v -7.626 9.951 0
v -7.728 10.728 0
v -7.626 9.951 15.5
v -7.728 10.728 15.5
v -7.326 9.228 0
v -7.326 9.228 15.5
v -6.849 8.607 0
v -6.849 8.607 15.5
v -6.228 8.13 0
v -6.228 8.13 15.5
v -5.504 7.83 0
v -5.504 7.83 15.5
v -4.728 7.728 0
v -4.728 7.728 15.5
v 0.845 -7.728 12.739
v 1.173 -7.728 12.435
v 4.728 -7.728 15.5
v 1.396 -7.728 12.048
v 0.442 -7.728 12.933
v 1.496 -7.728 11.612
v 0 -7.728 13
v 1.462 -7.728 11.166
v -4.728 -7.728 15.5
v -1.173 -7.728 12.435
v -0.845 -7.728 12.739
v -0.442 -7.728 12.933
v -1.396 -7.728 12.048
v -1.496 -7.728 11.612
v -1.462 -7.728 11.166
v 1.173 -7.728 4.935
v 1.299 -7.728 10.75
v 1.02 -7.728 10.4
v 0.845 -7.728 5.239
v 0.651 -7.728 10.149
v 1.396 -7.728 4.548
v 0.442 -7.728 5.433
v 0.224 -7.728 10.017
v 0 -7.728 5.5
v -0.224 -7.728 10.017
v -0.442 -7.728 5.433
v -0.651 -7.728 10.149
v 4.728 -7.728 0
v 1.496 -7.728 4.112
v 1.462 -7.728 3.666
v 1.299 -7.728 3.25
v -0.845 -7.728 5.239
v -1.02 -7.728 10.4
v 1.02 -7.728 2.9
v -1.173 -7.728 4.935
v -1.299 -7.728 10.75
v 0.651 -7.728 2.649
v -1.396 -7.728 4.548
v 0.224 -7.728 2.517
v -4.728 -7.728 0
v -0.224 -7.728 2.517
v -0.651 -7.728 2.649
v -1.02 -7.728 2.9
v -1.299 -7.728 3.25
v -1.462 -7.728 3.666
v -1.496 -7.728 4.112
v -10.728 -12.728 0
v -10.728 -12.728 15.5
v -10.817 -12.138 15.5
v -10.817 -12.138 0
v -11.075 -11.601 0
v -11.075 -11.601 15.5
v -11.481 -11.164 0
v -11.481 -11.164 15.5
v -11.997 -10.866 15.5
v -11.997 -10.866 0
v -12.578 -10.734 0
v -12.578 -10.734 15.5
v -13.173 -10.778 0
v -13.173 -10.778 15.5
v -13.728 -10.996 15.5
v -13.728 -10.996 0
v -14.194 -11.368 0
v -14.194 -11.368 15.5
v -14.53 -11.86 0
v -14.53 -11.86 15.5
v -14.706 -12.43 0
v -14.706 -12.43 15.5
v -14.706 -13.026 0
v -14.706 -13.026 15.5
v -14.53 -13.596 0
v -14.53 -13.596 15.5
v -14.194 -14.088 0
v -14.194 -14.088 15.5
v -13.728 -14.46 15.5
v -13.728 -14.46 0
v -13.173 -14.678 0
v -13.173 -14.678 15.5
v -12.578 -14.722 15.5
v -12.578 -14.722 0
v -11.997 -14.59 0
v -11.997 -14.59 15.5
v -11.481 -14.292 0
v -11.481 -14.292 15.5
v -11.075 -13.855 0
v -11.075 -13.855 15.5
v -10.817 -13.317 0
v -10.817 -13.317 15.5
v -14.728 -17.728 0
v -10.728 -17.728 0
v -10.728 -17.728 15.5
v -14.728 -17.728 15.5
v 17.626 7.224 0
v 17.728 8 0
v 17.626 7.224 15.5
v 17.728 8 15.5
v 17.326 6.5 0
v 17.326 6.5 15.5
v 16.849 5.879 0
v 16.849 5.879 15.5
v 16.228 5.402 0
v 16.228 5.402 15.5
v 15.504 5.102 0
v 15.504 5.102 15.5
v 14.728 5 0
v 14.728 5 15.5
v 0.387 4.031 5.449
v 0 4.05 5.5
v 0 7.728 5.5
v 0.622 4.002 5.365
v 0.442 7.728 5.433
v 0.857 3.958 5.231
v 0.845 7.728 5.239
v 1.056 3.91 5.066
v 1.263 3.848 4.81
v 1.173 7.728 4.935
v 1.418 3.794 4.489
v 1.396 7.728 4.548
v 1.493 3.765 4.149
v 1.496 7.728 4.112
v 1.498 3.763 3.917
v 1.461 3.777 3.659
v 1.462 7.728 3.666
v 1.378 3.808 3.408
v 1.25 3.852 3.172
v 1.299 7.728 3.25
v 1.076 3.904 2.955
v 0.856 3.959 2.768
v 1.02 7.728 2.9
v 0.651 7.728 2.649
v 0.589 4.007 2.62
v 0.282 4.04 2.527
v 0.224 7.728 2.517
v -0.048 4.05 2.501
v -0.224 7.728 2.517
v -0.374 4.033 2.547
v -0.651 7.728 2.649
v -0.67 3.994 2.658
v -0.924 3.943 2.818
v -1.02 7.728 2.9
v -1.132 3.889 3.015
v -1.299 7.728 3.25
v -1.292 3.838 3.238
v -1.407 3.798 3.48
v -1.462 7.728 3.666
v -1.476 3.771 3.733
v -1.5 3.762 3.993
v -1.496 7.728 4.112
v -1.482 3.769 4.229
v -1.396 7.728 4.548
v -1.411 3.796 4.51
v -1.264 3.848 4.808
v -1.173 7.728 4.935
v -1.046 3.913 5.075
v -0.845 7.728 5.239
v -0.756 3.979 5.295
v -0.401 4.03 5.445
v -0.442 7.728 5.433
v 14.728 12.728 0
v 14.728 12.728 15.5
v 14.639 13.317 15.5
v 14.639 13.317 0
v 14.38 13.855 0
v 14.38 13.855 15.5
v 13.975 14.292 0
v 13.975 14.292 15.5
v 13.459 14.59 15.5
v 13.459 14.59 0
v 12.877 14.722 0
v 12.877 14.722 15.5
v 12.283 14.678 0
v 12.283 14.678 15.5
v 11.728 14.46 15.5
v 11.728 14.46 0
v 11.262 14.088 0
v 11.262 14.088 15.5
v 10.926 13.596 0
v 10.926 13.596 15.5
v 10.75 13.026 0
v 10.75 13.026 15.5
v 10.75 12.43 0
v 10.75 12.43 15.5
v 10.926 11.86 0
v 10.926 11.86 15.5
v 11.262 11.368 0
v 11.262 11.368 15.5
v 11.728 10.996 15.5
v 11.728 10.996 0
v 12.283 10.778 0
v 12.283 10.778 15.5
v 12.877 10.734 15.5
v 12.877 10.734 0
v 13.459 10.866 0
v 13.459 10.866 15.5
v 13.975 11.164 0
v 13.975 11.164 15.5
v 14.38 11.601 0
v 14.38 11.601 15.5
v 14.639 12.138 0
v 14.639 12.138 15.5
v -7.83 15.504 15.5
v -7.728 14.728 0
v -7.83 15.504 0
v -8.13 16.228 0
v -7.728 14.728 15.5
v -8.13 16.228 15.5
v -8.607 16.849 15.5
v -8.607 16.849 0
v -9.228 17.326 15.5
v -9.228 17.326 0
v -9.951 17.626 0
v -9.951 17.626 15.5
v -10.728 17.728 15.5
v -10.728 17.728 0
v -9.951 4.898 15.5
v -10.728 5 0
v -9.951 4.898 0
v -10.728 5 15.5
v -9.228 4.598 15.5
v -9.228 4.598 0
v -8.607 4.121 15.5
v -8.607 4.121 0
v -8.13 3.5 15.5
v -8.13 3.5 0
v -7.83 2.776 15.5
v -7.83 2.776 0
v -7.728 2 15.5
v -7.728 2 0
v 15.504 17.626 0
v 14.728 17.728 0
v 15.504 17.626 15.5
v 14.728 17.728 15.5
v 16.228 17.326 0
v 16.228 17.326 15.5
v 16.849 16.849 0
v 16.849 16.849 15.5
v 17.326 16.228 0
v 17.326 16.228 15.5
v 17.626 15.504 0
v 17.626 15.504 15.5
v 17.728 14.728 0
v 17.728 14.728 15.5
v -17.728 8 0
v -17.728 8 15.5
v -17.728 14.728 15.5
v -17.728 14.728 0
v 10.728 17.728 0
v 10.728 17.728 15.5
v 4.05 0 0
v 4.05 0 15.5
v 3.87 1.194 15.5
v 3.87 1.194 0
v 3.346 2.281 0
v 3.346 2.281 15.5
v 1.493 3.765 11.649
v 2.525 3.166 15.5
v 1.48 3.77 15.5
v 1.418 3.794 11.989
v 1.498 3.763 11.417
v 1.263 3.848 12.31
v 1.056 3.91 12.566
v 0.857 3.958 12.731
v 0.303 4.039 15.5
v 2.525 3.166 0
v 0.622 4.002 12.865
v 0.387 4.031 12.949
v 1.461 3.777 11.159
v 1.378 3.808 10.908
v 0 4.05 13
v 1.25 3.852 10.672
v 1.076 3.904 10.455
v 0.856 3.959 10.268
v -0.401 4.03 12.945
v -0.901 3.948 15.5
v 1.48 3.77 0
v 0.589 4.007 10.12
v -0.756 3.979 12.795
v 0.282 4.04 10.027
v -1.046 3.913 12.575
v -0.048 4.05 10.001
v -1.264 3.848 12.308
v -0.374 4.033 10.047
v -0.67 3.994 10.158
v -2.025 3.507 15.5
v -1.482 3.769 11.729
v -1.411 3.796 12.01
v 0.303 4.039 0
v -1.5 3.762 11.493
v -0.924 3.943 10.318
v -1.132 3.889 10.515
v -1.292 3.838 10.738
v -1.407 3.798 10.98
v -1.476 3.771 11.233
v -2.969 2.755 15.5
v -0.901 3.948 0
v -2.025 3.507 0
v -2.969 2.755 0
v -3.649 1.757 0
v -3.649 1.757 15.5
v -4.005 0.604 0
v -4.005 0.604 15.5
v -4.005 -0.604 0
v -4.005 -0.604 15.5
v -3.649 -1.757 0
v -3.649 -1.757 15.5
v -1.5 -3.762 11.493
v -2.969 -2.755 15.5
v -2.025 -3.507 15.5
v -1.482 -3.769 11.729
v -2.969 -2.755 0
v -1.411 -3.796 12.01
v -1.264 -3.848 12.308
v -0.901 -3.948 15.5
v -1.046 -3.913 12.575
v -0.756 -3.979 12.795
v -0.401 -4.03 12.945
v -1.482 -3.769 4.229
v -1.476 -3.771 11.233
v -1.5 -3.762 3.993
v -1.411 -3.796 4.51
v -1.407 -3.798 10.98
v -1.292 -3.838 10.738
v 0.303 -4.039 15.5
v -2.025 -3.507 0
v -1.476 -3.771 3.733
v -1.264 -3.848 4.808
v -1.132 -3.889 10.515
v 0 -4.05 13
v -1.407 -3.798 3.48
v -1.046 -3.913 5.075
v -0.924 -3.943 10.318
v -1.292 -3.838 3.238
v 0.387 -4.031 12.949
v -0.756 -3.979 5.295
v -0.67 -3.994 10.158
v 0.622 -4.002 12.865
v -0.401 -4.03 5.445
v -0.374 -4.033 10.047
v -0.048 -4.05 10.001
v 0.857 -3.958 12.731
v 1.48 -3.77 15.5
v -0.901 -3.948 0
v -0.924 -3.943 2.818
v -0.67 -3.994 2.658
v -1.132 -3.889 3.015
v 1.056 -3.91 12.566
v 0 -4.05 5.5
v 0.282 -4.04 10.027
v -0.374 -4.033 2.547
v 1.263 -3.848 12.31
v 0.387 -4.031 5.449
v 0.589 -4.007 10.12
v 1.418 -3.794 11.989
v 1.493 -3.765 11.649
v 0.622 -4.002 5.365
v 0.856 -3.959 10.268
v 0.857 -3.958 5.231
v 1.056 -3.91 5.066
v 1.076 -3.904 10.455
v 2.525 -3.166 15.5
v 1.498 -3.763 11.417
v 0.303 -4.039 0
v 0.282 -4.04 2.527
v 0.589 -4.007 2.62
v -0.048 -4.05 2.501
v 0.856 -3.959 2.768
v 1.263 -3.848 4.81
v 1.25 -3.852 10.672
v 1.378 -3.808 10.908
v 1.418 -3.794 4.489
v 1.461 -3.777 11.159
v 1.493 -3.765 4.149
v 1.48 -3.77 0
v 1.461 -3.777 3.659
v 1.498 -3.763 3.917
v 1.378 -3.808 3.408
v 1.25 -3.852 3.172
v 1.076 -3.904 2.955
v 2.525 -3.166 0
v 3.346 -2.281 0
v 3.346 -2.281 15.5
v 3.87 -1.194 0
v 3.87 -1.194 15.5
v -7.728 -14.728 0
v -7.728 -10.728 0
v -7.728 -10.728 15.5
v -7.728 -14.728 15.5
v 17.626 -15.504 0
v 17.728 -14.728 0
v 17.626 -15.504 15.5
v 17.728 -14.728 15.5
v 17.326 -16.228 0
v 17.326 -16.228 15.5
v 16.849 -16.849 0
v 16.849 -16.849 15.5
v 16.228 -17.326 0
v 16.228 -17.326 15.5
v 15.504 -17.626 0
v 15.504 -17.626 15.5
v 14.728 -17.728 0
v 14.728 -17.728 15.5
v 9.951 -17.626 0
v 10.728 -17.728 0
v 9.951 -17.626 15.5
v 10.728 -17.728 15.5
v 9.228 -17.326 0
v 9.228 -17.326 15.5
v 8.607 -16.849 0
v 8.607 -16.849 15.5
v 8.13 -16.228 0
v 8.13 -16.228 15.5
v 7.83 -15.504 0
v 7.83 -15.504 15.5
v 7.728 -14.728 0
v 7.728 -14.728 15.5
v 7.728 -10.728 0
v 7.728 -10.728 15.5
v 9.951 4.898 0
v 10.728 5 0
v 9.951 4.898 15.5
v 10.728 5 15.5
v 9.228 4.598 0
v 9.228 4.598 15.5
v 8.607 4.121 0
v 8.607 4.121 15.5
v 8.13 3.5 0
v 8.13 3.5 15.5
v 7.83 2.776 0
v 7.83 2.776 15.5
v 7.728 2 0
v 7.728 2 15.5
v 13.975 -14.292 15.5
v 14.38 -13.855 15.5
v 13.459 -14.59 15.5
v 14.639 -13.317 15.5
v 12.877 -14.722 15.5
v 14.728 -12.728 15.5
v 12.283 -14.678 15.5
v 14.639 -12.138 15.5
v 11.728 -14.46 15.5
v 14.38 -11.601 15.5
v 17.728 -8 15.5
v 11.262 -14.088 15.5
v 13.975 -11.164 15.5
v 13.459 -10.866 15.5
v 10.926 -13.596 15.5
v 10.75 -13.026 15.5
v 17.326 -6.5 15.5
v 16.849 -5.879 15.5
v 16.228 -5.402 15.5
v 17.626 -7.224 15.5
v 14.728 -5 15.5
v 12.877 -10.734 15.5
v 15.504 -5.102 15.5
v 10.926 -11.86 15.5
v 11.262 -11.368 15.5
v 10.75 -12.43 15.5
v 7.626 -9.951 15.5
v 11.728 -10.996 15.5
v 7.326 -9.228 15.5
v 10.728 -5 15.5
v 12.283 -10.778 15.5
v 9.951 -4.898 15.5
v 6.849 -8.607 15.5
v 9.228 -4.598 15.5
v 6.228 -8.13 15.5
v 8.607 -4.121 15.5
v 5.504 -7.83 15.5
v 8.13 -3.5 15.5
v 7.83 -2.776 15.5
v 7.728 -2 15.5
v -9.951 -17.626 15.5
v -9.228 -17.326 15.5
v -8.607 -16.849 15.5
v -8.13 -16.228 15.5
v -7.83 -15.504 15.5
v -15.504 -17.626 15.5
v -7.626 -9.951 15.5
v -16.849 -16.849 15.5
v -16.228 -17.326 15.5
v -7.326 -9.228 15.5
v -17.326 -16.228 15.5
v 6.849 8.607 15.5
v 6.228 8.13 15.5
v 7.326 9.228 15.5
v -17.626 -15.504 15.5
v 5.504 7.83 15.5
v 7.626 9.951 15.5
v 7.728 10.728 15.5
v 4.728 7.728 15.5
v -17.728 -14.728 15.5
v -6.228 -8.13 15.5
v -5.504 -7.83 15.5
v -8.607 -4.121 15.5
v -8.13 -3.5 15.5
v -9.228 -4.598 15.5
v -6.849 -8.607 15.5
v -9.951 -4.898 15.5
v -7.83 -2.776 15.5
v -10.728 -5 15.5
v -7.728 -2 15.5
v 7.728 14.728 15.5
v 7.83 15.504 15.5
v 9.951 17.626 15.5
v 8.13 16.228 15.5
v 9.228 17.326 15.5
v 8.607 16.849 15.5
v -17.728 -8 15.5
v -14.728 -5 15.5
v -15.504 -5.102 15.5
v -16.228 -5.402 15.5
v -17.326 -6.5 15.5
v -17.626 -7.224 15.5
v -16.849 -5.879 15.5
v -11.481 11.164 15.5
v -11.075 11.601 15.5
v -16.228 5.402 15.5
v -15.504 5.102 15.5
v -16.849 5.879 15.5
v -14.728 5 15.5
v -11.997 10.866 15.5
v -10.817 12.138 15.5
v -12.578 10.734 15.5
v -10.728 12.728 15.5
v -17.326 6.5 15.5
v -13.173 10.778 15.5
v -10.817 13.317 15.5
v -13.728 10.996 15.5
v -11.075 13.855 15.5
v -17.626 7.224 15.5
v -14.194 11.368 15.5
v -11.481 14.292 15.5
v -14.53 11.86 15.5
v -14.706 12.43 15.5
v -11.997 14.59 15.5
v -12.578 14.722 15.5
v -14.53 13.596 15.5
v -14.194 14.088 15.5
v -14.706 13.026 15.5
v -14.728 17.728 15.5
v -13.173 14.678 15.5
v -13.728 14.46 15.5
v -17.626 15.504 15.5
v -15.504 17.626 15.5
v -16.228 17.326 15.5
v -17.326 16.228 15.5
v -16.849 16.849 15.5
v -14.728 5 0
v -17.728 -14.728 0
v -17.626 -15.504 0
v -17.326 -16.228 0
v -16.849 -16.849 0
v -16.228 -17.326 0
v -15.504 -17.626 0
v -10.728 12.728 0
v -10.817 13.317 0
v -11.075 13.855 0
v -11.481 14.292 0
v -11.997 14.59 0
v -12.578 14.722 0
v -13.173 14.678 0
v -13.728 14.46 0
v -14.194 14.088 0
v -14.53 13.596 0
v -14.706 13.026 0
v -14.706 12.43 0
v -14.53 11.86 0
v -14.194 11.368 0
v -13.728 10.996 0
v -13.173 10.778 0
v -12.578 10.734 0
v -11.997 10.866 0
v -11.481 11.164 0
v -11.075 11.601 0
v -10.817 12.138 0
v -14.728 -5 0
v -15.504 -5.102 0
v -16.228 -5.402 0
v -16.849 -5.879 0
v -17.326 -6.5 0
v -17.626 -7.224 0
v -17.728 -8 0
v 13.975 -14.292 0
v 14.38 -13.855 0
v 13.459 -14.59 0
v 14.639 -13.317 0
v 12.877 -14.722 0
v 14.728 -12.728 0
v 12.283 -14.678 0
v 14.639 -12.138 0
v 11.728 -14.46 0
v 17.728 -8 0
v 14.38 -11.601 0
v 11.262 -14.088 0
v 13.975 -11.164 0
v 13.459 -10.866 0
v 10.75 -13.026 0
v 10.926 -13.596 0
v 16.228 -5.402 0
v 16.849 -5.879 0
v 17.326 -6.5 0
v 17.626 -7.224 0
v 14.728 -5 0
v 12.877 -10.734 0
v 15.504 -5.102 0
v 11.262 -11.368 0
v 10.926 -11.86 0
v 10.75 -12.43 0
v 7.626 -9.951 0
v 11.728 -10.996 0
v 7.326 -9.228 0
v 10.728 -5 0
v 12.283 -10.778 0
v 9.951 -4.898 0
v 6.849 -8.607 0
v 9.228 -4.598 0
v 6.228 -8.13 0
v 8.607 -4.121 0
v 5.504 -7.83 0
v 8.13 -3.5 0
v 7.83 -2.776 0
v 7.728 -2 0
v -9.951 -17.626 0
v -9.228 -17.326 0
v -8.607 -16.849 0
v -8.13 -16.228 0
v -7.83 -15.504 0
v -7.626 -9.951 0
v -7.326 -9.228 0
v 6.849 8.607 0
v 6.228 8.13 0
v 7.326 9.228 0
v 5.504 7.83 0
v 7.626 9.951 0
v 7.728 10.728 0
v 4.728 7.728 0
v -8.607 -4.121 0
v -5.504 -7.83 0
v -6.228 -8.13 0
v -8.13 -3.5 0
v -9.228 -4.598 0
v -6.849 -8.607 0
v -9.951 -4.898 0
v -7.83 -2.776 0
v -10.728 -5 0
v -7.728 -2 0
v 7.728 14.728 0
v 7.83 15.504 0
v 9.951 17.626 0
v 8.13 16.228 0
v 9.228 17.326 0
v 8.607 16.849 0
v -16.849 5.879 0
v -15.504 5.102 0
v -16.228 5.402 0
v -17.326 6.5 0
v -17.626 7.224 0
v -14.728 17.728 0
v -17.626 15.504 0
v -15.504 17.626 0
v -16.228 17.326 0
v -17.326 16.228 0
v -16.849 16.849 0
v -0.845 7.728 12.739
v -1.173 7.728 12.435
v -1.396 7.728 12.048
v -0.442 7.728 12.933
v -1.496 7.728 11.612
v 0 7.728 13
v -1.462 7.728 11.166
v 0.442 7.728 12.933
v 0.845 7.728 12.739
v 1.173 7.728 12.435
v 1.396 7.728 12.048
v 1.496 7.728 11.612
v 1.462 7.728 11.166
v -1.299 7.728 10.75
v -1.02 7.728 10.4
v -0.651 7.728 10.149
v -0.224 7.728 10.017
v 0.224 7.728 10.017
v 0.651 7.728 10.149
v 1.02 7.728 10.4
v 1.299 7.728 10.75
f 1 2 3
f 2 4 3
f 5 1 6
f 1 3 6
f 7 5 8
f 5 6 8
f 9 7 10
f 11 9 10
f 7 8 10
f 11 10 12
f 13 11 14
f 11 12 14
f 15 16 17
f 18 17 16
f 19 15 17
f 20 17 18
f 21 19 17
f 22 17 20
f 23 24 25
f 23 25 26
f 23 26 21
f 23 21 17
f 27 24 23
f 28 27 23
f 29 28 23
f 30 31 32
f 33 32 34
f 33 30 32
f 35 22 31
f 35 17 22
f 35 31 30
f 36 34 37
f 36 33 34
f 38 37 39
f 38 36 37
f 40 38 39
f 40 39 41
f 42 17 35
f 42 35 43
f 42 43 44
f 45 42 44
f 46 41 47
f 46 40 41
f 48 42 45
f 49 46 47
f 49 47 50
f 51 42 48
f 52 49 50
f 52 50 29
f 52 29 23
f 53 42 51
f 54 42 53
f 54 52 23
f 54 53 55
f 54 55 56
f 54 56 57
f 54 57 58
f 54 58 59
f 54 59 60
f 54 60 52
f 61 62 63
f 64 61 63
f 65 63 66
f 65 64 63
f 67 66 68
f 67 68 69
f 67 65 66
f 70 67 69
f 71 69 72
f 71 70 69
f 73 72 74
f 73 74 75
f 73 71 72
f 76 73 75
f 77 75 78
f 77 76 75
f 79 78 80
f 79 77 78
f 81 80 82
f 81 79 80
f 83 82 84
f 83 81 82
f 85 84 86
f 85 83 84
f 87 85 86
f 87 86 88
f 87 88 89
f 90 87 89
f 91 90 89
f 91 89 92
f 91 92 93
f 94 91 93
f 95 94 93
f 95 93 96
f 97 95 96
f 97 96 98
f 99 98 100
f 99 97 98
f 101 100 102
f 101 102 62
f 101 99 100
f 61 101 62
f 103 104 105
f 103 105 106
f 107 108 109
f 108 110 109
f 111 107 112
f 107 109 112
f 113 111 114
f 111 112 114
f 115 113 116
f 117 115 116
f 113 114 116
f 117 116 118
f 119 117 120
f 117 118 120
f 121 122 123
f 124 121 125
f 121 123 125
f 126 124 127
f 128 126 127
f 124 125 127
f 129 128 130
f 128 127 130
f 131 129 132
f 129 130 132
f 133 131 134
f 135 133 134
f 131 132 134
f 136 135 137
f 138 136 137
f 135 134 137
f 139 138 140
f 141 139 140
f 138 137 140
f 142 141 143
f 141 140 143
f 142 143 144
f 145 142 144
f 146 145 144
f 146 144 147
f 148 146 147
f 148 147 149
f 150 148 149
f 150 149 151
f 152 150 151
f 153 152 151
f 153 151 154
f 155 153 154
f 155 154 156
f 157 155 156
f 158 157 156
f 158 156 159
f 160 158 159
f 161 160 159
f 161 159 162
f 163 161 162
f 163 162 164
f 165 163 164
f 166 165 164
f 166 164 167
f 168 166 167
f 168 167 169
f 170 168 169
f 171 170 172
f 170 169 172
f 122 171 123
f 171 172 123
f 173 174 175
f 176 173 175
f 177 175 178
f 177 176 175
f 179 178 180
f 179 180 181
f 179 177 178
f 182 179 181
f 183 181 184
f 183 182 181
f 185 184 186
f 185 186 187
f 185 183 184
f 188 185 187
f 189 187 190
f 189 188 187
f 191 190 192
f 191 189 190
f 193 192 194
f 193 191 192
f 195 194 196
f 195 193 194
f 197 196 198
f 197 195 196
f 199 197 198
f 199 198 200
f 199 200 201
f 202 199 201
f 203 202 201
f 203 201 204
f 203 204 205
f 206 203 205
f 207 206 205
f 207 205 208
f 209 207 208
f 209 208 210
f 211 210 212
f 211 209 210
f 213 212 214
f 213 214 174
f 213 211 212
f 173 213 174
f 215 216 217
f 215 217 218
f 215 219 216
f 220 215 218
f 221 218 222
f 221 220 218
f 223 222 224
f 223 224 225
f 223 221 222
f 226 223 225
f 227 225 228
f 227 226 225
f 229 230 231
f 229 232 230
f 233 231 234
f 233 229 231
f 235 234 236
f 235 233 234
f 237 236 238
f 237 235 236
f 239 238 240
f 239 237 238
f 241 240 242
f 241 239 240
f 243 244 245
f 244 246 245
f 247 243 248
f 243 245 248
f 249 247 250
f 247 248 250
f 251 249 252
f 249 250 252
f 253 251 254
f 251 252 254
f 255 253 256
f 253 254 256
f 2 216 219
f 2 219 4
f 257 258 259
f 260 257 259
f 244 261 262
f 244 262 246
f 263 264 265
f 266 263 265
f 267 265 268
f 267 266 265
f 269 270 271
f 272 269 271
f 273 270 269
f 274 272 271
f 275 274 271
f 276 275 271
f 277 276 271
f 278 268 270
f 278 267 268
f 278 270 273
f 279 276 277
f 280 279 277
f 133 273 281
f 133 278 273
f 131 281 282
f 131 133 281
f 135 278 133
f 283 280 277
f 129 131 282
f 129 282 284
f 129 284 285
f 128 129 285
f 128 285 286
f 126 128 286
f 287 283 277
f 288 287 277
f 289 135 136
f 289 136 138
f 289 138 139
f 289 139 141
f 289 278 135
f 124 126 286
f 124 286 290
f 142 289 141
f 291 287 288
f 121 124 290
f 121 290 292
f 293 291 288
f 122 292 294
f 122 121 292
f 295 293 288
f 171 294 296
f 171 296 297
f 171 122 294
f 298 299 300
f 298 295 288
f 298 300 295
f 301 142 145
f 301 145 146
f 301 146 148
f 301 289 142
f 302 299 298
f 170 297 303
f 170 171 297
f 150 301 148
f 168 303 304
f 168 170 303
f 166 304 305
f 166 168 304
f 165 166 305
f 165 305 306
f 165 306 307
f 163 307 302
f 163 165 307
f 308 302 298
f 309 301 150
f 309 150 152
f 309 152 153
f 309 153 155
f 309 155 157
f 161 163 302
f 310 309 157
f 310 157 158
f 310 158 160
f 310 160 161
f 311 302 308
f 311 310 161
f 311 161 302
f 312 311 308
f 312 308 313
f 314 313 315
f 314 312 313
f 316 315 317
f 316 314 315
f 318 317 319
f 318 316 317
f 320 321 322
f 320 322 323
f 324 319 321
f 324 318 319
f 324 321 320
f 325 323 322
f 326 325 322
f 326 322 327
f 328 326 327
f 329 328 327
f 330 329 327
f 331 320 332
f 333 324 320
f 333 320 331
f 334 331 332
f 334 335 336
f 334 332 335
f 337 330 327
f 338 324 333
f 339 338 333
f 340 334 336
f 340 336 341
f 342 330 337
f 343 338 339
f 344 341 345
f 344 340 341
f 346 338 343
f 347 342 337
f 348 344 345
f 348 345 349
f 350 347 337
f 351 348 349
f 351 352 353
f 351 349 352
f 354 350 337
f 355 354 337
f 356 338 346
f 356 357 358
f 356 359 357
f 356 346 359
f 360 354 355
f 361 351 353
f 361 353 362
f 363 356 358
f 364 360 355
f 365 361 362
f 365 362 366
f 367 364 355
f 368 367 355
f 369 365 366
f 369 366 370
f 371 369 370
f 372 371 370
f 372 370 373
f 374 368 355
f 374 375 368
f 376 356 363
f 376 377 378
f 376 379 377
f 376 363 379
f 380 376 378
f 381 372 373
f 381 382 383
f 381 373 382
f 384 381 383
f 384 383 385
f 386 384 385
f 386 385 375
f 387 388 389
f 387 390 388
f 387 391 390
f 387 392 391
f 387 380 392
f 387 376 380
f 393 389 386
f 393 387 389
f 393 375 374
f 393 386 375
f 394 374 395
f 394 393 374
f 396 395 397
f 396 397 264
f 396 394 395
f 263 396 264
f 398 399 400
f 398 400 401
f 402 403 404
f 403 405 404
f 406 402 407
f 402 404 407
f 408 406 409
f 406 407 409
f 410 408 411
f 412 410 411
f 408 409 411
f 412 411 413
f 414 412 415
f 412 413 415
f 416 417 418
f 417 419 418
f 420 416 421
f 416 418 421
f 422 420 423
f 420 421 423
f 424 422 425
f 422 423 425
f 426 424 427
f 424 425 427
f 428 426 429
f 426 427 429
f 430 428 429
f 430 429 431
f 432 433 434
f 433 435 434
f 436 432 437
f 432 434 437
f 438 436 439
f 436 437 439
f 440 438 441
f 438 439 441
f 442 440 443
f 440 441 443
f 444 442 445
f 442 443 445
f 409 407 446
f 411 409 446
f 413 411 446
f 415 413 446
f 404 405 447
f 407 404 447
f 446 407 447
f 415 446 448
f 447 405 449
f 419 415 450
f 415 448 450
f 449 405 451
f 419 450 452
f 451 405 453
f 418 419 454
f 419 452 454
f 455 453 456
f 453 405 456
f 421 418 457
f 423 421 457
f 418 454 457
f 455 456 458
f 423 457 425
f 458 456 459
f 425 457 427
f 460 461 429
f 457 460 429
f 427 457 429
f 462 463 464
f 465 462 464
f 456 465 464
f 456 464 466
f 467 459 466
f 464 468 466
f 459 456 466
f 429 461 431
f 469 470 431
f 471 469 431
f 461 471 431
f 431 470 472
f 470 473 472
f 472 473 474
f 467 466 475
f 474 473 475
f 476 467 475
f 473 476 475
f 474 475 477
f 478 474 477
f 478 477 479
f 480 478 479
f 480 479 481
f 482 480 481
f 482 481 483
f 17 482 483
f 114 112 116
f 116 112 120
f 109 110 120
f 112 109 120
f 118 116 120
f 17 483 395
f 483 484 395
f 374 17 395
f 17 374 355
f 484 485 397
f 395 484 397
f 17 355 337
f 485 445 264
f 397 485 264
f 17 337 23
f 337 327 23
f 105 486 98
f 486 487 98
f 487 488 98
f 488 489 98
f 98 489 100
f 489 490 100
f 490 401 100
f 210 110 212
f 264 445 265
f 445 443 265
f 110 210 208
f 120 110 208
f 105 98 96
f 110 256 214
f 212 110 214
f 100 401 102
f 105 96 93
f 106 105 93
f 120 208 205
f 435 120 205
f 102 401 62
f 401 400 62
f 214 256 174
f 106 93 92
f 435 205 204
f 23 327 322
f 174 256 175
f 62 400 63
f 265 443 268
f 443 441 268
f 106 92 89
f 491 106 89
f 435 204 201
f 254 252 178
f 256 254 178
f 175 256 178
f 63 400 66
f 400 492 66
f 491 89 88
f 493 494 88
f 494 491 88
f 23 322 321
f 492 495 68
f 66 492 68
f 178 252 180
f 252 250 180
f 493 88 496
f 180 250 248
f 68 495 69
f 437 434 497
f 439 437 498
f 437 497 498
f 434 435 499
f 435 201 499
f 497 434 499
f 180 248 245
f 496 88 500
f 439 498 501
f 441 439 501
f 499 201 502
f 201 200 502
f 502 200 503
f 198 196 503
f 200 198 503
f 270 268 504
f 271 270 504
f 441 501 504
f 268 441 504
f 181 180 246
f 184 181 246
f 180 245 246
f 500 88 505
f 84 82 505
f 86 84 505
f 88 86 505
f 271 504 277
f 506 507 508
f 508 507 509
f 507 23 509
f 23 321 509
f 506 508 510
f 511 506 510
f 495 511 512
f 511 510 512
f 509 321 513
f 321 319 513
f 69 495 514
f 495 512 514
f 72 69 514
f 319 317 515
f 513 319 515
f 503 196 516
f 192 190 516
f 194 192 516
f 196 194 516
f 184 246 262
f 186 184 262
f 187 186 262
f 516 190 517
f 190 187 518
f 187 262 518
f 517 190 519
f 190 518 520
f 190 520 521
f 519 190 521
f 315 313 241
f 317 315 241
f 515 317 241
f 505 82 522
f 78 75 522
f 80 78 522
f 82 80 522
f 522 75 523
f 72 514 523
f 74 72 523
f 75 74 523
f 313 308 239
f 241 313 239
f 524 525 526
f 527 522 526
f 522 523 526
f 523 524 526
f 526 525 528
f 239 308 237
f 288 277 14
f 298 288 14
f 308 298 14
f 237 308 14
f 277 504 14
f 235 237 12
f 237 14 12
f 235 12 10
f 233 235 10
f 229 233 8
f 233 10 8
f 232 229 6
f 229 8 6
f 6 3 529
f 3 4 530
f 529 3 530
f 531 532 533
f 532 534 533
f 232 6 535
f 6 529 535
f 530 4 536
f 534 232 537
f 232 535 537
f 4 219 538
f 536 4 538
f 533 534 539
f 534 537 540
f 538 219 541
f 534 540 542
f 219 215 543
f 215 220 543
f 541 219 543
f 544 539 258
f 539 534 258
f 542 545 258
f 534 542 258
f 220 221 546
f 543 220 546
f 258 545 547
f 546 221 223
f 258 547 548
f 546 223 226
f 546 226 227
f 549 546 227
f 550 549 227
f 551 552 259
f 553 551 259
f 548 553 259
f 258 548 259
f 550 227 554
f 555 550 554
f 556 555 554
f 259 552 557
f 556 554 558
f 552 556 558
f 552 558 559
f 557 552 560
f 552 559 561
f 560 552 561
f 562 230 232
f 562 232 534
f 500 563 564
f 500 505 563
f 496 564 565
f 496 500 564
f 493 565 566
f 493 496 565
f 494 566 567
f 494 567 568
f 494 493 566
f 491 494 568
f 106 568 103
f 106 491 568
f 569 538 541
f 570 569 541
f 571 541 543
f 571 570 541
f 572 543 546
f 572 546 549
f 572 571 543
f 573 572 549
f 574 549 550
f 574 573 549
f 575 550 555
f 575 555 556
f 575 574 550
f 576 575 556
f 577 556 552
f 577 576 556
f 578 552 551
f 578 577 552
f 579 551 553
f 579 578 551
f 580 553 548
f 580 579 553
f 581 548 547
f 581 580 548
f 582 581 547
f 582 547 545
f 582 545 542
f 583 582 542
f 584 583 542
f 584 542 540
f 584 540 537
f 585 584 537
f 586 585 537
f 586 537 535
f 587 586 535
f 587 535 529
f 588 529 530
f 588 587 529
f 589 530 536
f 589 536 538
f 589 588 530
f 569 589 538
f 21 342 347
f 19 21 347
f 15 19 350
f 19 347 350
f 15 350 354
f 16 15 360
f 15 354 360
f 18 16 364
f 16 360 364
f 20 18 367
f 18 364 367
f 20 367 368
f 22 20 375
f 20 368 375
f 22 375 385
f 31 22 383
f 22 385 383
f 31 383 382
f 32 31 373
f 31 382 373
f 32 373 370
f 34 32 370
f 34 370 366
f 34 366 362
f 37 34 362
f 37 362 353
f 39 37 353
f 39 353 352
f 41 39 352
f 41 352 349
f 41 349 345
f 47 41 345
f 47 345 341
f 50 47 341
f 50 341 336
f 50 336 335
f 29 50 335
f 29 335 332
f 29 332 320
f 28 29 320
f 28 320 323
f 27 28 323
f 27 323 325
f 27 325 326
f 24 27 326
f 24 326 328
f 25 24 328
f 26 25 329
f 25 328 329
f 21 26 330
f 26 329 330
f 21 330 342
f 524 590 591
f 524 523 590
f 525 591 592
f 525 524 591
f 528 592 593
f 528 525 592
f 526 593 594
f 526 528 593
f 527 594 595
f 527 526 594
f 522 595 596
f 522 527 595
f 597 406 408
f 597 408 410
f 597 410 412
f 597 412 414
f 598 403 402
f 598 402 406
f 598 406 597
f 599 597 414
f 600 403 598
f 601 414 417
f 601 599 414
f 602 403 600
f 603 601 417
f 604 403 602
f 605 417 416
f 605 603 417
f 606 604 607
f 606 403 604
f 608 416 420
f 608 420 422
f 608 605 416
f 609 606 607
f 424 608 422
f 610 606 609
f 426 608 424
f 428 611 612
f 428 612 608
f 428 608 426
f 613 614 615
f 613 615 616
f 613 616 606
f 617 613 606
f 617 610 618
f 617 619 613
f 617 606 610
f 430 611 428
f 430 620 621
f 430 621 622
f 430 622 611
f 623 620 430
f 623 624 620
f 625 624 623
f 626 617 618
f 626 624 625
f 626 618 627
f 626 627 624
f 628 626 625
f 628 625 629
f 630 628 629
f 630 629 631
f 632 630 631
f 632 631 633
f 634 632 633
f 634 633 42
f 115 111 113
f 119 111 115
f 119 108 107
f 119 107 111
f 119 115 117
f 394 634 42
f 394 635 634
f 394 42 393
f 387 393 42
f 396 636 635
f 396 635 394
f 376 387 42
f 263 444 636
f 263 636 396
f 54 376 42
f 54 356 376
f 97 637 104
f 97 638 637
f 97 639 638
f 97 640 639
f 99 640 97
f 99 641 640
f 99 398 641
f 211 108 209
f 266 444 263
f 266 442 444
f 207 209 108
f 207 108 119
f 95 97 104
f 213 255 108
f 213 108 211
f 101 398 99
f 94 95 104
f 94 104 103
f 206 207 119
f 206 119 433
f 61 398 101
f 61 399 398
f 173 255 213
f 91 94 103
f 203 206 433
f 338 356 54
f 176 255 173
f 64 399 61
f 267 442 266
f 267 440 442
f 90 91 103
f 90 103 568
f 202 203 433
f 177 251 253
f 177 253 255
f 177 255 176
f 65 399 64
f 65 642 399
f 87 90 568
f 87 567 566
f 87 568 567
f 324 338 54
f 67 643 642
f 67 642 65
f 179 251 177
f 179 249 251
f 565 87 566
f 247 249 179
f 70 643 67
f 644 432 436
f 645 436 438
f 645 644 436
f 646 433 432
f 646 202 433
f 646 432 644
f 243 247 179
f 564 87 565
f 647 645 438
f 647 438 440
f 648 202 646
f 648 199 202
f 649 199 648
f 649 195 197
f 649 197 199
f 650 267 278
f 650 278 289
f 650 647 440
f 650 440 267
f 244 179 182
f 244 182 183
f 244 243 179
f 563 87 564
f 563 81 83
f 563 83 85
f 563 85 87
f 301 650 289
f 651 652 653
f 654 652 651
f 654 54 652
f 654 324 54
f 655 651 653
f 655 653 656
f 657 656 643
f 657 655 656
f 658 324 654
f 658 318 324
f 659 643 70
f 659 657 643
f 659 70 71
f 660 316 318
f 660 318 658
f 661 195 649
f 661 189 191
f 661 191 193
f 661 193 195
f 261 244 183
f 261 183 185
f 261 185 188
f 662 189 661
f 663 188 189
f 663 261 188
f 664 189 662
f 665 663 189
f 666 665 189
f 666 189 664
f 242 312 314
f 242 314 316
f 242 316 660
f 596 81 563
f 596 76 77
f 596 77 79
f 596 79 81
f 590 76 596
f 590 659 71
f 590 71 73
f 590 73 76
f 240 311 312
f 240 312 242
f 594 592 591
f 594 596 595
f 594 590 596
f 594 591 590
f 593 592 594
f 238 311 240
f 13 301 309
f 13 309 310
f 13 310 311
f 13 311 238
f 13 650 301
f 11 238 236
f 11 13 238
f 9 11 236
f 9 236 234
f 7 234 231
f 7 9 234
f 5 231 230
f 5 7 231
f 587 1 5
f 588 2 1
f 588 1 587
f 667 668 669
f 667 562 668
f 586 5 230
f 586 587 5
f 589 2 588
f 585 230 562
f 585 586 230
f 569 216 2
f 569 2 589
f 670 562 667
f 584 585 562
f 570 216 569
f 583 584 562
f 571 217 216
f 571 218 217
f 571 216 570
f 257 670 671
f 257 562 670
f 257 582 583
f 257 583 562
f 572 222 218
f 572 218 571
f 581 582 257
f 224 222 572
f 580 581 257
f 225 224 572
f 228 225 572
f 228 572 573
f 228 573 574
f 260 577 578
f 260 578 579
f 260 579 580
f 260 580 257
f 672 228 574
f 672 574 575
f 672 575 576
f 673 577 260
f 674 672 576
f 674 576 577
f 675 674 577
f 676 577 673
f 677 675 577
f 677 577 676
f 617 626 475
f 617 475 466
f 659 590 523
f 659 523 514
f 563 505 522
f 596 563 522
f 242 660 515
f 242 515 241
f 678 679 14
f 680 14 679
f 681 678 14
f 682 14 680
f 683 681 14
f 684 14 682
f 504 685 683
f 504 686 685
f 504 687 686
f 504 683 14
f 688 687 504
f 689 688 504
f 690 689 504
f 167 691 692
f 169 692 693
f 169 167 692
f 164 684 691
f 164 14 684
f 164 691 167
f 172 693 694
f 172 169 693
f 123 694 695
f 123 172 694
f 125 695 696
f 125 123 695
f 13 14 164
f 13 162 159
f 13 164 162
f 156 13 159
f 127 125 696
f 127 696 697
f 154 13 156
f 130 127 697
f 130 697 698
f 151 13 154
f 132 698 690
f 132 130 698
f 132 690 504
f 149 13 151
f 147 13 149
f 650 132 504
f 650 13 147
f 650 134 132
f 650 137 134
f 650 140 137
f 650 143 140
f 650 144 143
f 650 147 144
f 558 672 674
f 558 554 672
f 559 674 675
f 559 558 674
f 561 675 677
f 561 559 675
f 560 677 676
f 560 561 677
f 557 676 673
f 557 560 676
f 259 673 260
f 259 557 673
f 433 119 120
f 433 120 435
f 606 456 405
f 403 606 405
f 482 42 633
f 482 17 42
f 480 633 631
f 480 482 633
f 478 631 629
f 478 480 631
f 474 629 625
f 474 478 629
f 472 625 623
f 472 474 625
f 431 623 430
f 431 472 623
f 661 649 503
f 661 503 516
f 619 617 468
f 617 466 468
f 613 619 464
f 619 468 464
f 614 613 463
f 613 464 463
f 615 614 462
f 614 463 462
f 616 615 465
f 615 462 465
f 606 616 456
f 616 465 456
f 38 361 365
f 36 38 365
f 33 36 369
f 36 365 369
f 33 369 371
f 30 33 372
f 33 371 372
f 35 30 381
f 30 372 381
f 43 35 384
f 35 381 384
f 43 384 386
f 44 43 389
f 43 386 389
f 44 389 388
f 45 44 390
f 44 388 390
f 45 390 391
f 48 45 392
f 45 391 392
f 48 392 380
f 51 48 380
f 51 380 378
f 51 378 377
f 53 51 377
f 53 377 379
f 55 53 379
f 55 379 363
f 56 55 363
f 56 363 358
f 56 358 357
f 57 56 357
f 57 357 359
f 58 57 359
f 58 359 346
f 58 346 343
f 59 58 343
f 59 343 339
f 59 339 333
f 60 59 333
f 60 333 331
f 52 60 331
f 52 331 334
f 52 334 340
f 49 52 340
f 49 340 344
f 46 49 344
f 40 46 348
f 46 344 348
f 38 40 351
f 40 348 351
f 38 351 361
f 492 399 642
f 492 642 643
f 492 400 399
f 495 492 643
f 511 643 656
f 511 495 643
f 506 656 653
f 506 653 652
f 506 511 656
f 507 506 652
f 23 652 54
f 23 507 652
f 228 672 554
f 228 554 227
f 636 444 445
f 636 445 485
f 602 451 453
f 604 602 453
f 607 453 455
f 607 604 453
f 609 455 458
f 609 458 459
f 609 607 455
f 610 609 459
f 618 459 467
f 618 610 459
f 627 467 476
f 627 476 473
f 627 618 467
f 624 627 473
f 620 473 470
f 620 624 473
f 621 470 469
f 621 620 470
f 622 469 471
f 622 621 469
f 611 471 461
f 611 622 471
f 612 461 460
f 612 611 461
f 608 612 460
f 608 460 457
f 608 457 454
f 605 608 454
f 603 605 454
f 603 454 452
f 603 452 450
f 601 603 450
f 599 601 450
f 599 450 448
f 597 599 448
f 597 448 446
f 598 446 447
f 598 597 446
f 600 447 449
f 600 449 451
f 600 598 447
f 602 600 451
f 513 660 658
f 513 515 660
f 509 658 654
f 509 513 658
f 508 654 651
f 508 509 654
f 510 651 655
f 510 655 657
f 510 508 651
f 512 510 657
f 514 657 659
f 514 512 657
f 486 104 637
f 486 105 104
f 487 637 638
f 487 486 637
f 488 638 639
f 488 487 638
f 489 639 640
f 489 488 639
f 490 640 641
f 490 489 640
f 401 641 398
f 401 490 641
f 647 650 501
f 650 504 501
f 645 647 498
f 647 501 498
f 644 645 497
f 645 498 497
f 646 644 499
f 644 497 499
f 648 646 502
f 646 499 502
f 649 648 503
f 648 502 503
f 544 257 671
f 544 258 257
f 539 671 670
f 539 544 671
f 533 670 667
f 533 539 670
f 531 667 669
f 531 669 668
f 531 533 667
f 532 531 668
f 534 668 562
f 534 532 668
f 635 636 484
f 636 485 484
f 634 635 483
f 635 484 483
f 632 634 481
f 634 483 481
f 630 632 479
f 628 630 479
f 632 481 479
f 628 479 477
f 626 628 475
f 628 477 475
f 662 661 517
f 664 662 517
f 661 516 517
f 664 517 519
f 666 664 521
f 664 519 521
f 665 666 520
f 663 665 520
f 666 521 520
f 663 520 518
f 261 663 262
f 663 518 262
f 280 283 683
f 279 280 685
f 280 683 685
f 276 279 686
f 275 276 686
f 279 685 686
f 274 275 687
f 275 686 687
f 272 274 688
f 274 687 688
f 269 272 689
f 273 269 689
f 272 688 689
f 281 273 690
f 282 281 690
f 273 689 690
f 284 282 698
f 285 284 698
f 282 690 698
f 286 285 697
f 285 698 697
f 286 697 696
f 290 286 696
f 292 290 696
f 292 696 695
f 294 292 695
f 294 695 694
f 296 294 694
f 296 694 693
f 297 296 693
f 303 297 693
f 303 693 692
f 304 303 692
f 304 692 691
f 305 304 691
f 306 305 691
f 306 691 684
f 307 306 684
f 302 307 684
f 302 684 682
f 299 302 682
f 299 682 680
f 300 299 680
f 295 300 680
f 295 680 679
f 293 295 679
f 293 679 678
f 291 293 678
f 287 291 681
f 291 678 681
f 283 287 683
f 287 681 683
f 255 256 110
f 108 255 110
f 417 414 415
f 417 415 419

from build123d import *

# Parameters (mm, degrees)
SKETCH_1_R          = 2
SKETCH_1_R_2        = 4.05
EXTRUDE_1_DEPTH     = 15.5
FILLET_3_R          = 3
SKETCH_3_R          = 1.5
CUT_EXTRUDE_2_DEPTH = 35.677503091


with BuildPart() as part:
    # ｽｹｯﾁ1 → ﾎﾞｽ - 押し出し1 (new body)
    with BuildSketch(Plane.XY):
        Polygon((-7.727922061, 17.727922061), (-7.727922061, 7.727922061), (7.727922061, 7.727922061), (7.727922061, 17.727922061), (17.727922061, 17.727922061), (17.727922061, 5), (7.727922061, 5), (7.727922061, -5), (17.727922061, -5), (17.727922061, -17.727922061), (7.727922061, -17.727922061), (7.727922061, -7.727922061), (-7.727922061, -7.727922061), (-7.727922061, -17.727922061), (-17.727922061, -17.727922061), (-17.727922061, -5), (-7.727922061, -5), (-7.727922061, 5), (-17.727922061, 5), (-17.727922061, 17.727922061), align=None)
        with Locations((-12.727922061, 12.727922061)):
            Circle(SKETCH_1_R, mode=Mode.SUBTRACT)
        with Locations((12.727922061, 12.727922061)):
            Circle(SKETCH_1_R, mode=Mode.SUBTRACT)
        with Locations((12.727922061, -12.727922061)):
            Circle(SKETCH_1_R, mode=Mode.SUBTRACT)
        with Locations((-12.727922061, -12.727922061)):
            Circle(SKETCH_1_R, mode=Mode.SUBTRACT)
        Circle(SKETCH_1_R_2, mode=Mode.SUBTRACT)
    extrude(amount=EXTRUDE_1_DEPTH)

    # ﾌｨﾚｯﾄ3
    fillet_3_edges = [part.edges().sort_by_distance(p)[0] for p in [
        (-17.727922061, 17.727922061, 7.75),
        (-7.727922061, 17.727922061, 7.75),
        (-7.727922061, 7.727922061, 7.75),
        (7.727922061, 7.727922061, 7.75),
        (7.727922061, 17.727922061, 7.75),
        (17.727922061, 17.727922061, 7.75),
        (17.727922061, 5, 7.75),
        (7.727922061, 5, 7.75),
        (7.727922061, -5, 7.75),
        (17.727922061, -5, 7.75),
        (17.727922061, -17.727922061, 7.75),
        (7.727922061, -17.727922061, 7.75),
        (7.727922061, -7.727922061, 7.75),
        (-7.727922061, -7.727922061, 7.75),
        (-7.727922061, -17.727922061, 7.75),
        (-17.727922061, -17.727922061, 7.75),
        (-17.727922061, -5, 7.75),
        (-7.727922061, -5, 7.75),
        (-7.727922061, 5, 7.75),
        (-17.727922061, 5, 7.75),
    ]]
    fillet(fillet_3_edges, radius=FILLET_3_R)

    # ｽｹｯﾁ3 → ｶｯﾄ - 押し出し2 (cut, through all)
    with BuildSketch(Plane(origin=(0, 7.727922061, 0), x_dir=(1, 0, 0), z_dir=(0, 1, 0))):
        with Locations(Location((0, -4, 0), (0, 0, 270))):
            Circle(SKETCH_3_R)
        with Locations(Location((0, -11.5, 0), (0, 0, 270))):
            Circle(SKETCH_3_R)
    extrude(amount=-CUT_EXTRUDE_2_DEPTH, mode=Mode.SUBTRACT)


solid = part.part
